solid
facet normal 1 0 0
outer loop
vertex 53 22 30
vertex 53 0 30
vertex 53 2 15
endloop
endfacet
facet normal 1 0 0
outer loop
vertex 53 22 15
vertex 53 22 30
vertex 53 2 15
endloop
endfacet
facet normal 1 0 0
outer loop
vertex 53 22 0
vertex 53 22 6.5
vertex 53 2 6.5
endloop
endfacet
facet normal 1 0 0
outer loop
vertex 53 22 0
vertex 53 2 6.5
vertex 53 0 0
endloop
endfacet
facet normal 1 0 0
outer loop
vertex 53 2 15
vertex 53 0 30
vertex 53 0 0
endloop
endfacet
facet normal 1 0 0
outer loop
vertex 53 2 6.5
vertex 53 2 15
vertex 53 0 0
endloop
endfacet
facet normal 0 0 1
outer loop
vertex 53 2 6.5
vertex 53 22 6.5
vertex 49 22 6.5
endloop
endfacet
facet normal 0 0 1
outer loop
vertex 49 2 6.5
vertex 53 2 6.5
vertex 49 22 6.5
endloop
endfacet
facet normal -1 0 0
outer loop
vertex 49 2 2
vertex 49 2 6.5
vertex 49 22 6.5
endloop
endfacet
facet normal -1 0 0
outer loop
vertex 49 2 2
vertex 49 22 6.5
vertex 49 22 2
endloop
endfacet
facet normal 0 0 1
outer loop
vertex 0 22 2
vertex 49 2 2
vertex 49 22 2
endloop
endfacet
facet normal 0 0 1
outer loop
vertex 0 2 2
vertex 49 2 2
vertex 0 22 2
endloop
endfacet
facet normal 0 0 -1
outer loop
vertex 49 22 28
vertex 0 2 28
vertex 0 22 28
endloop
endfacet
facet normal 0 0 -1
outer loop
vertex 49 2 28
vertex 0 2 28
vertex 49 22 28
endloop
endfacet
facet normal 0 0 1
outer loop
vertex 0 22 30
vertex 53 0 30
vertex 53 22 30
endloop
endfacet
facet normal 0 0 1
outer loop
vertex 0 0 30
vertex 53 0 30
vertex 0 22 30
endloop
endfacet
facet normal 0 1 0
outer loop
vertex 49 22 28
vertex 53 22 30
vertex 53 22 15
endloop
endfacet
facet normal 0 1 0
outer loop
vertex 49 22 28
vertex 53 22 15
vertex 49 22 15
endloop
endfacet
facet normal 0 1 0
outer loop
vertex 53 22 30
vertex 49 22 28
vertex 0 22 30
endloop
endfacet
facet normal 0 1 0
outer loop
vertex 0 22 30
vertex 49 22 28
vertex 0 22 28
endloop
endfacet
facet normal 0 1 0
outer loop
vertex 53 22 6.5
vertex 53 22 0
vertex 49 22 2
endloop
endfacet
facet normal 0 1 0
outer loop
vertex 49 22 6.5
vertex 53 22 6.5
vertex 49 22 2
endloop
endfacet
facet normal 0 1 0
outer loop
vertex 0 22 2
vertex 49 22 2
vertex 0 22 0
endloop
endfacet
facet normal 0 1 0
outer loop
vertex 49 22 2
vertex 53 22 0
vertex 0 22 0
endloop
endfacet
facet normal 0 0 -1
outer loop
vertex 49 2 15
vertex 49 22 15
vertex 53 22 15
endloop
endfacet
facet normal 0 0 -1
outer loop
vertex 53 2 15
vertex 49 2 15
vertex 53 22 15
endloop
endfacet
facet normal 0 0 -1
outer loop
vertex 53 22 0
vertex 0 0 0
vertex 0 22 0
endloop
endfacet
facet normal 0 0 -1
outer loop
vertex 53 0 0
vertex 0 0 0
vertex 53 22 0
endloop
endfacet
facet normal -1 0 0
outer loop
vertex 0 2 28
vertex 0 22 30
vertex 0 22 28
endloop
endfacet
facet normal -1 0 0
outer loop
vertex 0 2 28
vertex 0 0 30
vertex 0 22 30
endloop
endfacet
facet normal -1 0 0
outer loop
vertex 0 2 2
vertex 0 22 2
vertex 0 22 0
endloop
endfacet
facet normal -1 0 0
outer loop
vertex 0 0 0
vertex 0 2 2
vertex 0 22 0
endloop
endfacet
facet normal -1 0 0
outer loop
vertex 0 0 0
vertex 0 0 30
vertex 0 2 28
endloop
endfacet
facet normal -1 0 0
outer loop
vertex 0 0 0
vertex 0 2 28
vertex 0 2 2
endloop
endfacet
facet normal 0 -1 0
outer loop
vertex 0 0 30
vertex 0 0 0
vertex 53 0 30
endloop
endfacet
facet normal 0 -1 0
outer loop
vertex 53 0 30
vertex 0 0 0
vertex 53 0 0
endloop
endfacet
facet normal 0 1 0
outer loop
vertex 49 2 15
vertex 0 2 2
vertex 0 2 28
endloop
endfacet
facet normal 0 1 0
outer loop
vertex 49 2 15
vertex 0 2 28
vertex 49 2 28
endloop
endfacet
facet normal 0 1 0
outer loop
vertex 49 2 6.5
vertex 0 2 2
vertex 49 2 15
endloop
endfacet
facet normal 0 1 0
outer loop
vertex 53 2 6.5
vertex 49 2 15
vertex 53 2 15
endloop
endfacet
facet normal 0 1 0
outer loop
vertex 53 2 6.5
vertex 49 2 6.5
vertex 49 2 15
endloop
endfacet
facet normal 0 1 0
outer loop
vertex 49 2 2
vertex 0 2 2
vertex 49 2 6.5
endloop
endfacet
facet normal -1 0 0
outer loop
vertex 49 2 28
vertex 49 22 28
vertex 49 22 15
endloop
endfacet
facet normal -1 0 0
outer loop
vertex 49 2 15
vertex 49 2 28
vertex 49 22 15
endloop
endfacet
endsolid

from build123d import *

# Parameters (mm, degrees)
SKETCH1_W           = 53
SKETCH1_H           = 30
BOSS_EXTRUDE1_DEPTH = 2
BOSS_EXTRUDE2_DEPTH = 20


with BuildPart() as part:
    # Sketch1 → Boss-Extrude1 (new body)
    with BuildSketch(Plane(origin=(0, 0, 0), x_dir=(1, 0, 0), z_dir=(0, 1, 0))):
        with Locations((26.5, -15)):
            Rectangle(SKETCH1_W, SKETCH1_H)
    extrude(amount=BOSS_EXTRUDE1_DEPTH)

    # Sketch2 → Boss-Extrude2 (add)
    with BuildSketch(Plane(origin=(0, 2, 0), x_dir=(1, 0, 0), z_dir=(0, 1, 0))):
        Polygon((0, -28), (49, -28), (49, -15), (53, -15), (53, -30), (0, -30), align=None)
        Polygon((49, -2), (0, -2), (0, 0), (53, 0), (53, -6.5), (49, -6.5), align=None)
    extrude(amount=BOSS_EXTRUDE2_DEPTH)


solid = part.part
